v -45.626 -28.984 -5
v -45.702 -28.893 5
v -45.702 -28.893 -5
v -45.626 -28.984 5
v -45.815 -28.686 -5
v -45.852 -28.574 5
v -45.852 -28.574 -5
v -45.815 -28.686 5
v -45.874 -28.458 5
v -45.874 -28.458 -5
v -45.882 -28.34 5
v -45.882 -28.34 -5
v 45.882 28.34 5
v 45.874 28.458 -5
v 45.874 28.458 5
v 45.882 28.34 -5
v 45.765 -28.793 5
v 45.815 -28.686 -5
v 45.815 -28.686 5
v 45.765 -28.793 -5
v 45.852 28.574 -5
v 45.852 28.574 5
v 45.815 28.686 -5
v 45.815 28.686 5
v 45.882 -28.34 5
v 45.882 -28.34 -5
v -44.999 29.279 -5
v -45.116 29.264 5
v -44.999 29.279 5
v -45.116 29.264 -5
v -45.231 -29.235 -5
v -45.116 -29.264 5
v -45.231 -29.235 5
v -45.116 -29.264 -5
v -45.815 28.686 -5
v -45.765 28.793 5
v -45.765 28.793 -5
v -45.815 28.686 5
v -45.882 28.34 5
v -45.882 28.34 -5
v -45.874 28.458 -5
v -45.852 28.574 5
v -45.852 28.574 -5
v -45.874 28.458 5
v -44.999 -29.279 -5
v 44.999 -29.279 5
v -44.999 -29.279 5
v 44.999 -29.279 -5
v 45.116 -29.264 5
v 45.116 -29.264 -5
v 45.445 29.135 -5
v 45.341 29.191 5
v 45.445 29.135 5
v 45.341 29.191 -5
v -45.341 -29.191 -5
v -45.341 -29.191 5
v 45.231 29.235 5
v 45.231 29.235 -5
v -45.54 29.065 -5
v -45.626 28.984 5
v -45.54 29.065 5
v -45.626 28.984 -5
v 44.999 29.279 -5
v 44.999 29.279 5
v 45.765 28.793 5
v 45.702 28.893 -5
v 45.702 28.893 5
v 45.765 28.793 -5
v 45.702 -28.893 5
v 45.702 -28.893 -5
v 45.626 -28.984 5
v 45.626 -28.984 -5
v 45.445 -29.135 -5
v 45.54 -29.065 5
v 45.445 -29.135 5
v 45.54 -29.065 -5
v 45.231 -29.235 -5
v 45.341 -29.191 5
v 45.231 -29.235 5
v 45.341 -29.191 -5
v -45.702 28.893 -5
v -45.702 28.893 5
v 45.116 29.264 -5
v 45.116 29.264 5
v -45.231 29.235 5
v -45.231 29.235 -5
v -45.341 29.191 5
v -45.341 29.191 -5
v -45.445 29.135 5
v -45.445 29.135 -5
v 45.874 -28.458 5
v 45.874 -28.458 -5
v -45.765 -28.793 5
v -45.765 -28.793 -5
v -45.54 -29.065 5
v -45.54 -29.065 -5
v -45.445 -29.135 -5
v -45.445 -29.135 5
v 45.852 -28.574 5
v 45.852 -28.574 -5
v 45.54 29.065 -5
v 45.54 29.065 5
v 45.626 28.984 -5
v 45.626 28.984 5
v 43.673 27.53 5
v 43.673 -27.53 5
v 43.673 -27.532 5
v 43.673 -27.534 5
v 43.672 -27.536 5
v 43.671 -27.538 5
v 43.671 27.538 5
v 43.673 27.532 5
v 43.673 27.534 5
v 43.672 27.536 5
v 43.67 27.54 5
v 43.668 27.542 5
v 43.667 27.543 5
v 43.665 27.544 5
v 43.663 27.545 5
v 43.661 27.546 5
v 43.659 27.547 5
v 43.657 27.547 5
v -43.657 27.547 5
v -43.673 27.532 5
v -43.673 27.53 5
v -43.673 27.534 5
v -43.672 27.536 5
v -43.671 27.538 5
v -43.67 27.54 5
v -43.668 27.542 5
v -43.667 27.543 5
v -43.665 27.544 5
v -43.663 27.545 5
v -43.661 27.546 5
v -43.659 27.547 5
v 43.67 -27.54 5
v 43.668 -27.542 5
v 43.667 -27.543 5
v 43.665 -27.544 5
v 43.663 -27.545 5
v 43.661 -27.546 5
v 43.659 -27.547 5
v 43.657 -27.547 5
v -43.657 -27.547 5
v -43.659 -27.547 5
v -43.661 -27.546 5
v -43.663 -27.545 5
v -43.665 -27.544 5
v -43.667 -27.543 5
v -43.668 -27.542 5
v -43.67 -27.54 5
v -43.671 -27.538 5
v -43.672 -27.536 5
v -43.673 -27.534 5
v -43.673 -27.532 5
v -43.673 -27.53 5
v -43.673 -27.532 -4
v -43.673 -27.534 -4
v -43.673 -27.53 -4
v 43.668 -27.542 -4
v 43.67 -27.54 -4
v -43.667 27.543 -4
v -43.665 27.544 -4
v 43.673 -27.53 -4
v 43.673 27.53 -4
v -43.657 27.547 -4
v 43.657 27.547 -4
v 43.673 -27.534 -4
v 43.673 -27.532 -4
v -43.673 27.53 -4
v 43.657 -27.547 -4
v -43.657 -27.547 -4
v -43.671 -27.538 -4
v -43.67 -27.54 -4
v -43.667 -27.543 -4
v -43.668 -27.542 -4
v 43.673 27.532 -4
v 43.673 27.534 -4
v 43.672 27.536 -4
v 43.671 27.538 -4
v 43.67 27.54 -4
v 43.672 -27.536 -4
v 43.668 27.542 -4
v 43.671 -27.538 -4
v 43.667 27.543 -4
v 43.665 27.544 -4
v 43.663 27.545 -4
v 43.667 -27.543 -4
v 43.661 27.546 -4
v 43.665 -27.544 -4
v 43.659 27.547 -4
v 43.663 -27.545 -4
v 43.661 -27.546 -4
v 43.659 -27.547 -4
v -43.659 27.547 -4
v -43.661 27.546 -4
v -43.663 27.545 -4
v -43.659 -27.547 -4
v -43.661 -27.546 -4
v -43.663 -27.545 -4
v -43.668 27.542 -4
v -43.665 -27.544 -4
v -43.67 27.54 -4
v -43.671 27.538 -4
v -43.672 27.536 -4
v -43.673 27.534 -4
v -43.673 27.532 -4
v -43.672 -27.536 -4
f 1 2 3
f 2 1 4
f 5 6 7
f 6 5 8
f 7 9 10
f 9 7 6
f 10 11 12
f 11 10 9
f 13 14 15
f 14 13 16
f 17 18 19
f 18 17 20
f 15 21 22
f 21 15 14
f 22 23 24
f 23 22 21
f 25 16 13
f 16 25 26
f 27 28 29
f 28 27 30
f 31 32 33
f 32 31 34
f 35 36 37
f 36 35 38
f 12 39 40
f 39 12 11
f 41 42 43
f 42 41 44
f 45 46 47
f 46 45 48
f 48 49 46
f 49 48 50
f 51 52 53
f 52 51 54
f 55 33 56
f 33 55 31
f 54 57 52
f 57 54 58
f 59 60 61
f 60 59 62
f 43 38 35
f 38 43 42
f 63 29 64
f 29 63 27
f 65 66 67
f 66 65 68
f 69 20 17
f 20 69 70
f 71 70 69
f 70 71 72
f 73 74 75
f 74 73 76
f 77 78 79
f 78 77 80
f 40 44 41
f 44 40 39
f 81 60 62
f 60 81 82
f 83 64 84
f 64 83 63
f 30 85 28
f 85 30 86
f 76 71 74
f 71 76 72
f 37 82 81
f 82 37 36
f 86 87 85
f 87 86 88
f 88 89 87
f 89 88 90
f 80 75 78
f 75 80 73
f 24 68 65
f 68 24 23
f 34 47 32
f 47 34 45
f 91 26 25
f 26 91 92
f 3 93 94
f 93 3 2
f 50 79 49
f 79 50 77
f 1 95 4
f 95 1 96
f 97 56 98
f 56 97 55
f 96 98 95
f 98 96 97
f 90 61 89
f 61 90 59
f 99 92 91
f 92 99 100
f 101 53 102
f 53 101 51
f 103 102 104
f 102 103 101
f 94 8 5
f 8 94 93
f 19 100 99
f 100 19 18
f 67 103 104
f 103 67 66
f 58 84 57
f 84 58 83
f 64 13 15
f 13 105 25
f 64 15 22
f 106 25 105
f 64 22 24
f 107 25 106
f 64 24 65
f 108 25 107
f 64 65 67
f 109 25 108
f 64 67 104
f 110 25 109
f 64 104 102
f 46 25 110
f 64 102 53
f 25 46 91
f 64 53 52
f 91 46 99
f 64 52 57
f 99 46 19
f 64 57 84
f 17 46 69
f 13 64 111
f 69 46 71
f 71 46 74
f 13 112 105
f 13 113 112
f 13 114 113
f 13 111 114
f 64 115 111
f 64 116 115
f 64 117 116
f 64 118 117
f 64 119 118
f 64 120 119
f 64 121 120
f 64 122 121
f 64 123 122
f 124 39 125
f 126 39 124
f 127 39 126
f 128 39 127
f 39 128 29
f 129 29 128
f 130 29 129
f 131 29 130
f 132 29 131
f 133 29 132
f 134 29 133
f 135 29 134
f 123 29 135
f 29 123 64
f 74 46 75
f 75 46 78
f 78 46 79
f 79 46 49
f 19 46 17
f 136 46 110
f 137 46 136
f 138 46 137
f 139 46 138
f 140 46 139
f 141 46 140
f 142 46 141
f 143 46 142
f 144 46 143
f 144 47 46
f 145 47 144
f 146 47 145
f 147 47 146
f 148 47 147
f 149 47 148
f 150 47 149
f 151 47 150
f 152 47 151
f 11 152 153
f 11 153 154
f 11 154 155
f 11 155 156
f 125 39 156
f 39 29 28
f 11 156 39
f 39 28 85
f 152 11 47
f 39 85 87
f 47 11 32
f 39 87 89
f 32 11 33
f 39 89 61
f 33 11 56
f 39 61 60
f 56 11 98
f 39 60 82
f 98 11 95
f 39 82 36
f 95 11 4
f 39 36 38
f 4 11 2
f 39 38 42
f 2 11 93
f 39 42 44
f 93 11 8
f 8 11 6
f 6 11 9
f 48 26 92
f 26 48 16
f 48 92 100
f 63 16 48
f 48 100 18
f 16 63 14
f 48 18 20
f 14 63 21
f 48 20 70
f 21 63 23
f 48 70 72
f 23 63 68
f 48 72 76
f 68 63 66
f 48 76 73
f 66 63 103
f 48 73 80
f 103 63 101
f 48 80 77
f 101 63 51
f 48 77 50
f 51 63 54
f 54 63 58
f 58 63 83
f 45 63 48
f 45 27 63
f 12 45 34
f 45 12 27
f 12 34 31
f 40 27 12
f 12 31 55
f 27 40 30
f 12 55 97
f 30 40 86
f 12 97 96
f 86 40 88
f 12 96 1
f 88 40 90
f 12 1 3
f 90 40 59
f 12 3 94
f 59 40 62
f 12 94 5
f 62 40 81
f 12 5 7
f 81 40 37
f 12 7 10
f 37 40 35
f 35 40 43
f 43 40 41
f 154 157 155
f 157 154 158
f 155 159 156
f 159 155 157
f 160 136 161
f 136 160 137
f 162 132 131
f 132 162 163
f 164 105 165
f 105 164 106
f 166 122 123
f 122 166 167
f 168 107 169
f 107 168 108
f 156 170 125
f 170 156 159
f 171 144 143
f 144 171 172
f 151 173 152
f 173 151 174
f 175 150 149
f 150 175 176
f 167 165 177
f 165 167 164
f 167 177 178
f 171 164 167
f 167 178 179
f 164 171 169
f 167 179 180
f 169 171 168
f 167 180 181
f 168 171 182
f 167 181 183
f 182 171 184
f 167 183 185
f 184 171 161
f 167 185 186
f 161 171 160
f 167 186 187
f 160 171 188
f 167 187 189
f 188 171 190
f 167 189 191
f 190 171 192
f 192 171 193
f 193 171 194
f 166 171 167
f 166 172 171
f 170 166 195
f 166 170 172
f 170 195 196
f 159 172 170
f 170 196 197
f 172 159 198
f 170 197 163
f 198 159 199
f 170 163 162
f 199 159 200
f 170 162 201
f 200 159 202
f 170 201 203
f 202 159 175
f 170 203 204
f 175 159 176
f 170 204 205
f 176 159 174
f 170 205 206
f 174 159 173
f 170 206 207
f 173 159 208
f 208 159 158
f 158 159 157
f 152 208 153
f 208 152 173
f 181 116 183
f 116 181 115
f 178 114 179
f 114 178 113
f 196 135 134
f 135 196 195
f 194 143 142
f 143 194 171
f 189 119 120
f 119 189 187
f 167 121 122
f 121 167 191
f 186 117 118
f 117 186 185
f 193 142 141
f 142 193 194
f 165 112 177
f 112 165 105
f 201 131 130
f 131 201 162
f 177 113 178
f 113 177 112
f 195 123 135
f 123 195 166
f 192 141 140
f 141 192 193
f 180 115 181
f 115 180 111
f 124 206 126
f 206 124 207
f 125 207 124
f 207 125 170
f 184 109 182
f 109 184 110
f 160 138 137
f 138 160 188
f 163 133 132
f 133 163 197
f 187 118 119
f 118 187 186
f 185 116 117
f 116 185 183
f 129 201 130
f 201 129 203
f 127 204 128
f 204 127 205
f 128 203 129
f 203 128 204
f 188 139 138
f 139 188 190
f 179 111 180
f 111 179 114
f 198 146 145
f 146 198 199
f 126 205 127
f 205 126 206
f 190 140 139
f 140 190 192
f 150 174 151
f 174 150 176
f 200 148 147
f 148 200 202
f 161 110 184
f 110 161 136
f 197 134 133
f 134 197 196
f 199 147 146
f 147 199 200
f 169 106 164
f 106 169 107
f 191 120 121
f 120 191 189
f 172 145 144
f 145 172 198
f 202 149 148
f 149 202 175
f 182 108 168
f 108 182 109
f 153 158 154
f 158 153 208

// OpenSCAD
// carnet.scad
// por @montoyamoraga
// para @piruetasxyz

$fn=50;

// ancho en mm
ANCHO = 85.60;

// largo en mm
LARGO = 53.98;

// radio de esquinas en mm
RADIO_ESQUINAS = 3;

// definir tolerancia en porcentaje
TOLERANCIA = 0.01;

// definir tolerancia afuera en porcentaje
TOLERANCIA_AFUERA = 0.05;

// definir tolerancia adentro en porcentaje
TOLERANCIA_ADENTRO = 0.02;

// definir radio esquina en porcentaje
RADIO_ESQUINA = 0.01;

// https://en.wikibooks.org/wiki/OpenSCAD_User_Manual/Transformations

module carnet(altura) {

difference() {

  // cubo exterior
  linear_extrude(
  height = altura,
  center = true,
  convexity = 1) {
    
    // hull of 2D figures
    color("magenta", 1.0)
    hull() {
      translate([
      -(1+ TOLERANCIA_AFUERA) * ANCHO/2,
      -(1+ TOLERANCIA_AFUERA) * LARGO/2
      ])
      circle(r = RADIO_ESQUINA * (1.1) * ANCHO);

      translate([
      -(1+ TOLERANCIA_AFUERA) * ANCHO/2,
      +(1 + TOLERANCIA_AFUERA) * LARGO/2])
      circle(r = RADIO_ESQUINA * (1.1) * ANCHO);

      translate([
      +(1+ TOLERANCIA_AFUERA)*ANCHO/2,
      -(1+ TOLERANCIA_AFUERA)*LARGO/2
      ])
      circle(r = RADIO_ESQUINA * (1.1) * ANCHO);

      translate([
      +(1+ TOLERANCIA_AFUERA)*ANCHO/2,
      +(1+ TOLERANCIA_AFUERA)*LARGO/2
      ])
      circle(r = RADIO_ESQUINA * (1.1) * ANCHO);
    }

  }

  // cubo interior que crea el hueco
  color("magenta", 3.0)
  translate([0, 0, 1.0])
  linear_extrude(
  height = altura,
  center = true,
  convexity = 1) {
    
    // hull of 2D figures

    
    hull() {
      translate([
      -(1+ TOLERANCIA_ADENTRO) * ANCHO/2,
      -(1+ TOLERANCIA_ADENTRO) * LARGO/2
      ])
      circle(r = RADIO_ESQUINA * ANCHO * TOLERANCIA_ADENTRO);

      translate([
      -(1+ TOLERANCIA_ADENTRO) * ANCHO/2,
      +(1 + TOLERANCIA_ADENTRO) * LARGO/2])
      circle(r = RADIO_ESQUINA*ANCHO * TOLERANCIA_ADENTRO);

      translate([
      +(1+ TOLERANCIA_ADENTRO)*ANCHO/2,
      -(1+ TOLERANCIA_ADENTRO)*LARGO/2
      ])
      circle(r = RADIO_ESQUINA*ANCHO * TOLERANCIA_ADENTRO);

      translate([
      +(1+ TOLERANCIA_ADENTRO)*ANCHO/2,
      +(1+ TOLERANCIA_ADENTRO)*LARGO/2
      ])
      circle(r = RADIO_ESQUINA*ANCHO * TOLERANCIA_ADENTRO);
    }

  }

}

}


// usar modulo con cierta altura
carnet(10);
